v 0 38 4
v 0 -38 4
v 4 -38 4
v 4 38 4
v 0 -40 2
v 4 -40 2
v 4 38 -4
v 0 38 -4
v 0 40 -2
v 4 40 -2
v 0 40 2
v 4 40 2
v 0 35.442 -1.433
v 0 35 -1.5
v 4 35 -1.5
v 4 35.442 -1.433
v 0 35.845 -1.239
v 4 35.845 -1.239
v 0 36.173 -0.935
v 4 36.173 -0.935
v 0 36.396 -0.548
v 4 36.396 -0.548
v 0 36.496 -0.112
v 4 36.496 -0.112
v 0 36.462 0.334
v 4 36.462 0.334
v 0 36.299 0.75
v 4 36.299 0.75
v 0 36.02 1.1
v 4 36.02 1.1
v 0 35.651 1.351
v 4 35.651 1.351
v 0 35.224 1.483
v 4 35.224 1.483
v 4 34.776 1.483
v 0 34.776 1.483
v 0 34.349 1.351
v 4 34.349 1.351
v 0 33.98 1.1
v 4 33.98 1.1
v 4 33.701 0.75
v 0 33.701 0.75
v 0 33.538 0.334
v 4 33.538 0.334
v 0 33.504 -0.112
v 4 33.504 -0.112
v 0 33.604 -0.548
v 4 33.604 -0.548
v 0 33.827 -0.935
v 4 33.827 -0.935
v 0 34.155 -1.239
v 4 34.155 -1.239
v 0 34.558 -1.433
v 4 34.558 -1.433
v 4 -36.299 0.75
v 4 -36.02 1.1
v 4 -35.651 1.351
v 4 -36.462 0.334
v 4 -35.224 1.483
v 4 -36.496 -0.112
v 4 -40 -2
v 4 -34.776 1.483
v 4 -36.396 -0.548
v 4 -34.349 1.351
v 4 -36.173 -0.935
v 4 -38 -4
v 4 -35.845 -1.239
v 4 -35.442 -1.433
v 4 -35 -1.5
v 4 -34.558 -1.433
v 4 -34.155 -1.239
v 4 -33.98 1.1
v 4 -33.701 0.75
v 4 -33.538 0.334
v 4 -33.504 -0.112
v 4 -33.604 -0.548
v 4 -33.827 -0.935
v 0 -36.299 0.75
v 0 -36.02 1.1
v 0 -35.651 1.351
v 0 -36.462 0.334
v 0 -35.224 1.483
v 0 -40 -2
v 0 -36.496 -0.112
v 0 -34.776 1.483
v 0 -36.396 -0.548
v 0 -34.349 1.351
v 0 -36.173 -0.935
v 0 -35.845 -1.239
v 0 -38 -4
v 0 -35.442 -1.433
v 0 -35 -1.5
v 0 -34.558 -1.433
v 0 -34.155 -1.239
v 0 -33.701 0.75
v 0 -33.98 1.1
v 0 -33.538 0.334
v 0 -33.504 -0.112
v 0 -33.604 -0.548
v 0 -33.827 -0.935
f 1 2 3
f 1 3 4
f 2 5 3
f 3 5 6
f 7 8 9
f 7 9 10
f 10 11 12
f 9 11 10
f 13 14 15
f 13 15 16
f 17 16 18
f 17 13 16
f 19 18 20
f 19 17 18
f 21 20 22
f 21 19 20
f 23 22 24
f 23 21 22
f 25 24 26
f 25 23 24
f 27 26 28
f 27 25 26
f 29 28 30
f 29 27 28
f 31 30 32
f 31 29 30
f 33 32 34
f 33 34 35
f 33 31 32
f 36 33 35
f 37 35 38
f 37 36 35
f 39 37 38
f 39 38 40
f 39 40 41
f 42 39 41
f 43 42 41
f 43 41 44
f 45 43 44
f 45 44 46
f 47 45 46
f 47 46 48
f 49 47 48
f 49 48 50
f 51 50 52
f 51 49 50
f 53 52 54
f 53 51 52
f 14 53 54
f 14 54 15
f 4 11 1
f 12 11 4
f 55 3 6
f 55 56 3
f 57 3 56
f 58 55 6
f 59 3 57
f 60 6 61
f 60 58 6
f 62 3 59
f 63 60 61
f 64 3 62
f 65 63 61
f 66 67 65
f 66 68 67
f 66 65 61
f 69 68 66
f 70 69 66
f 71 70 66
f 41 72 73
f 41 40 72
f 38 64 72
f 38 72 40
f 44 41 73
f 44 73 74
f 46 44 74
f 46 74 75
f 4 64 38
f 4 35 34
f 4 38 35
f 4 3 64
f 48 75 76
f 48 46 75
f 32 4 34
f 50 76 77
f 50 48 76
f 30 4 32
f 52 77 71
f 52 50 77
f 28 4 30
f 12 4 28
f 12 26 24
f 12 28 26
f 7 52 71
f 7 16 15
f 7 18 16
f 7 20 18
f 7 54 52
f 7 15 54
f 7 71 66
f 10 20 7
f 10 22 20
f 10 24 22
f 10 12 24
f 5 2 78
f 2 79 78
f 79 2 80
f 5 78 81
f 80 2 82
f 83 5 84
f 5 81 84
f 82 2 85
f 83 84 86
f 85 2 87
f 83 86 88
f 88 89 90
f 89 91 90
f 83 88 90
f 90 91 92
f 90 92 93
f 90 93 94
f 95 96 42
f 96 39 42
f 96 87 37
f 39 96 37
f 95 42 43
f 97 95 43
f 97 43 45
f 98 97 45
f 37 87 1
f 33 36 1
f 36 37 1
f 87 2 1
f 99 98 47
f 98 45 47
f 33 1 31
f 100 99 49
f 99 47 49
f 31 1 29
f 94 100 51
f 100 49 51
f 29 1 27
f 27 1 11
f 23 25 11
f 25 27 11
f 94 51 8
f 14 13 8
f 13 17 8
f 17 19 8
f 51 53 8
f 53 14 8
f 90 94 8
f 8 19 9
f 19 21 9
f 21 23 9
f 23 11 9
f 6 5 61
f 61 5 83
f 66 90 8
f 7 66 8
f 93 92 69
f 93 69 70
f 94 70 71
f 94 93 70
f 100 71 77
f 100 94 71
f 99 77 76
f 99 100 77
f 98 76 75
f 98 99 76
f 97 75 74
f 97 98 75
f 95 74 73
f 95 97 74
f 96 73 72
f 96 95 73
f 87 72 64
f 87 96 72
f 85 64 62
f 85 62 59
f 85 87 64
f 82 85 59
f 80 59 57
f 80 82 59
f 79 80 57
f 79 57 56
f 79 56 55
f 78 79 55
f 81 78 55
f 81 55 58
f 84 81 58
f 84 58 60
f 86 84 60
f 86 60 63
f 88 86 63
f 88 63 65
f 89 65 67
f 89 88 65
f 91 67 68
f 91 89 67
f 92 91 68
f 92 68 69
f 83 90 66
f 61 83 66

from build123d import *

# Parameters (mm, degrees)
SKETCH1_W           = 8
SKETCH1_H           = 80
SKETCH1_R           = 1.5
BOSS_EXTRUDE1_DEPTH = 4
CHAMFER1_SIZE       = 2


with BuildPart() as part:
    # Sketch1 → Boss-Extrude1 (new body)
    with BuildSketch(Plane(origin=(0, 0, 0), x_dir=(0, 0, -1), z_dir=(1, 0, 0))):
        Rectangle(SKETCH1_W, SKETCH1_H)
        with Locations((0, -35)):
            Circle(SKETCH1_R, mode=Mode.SUBTRACT)
        with Locations((0, 35)):
            Circle(SKETCH1_R, mode=Mode.SUBTRACT)
    extrude(amount=BOSS_EXTRUDE1_DEPTH)

    # Chamfer1
    chamfer1_edges = [part.edges().sort_by_distance(p)[0] for p in [
        (2, -40, -4),
        (2, -40, 4),
        (2, 40, 4),
        (2, 40, -4),
    ]]
    chamfer(chamfer1_edges, length=CHAMFER1_SIZE)


solid = part.part
